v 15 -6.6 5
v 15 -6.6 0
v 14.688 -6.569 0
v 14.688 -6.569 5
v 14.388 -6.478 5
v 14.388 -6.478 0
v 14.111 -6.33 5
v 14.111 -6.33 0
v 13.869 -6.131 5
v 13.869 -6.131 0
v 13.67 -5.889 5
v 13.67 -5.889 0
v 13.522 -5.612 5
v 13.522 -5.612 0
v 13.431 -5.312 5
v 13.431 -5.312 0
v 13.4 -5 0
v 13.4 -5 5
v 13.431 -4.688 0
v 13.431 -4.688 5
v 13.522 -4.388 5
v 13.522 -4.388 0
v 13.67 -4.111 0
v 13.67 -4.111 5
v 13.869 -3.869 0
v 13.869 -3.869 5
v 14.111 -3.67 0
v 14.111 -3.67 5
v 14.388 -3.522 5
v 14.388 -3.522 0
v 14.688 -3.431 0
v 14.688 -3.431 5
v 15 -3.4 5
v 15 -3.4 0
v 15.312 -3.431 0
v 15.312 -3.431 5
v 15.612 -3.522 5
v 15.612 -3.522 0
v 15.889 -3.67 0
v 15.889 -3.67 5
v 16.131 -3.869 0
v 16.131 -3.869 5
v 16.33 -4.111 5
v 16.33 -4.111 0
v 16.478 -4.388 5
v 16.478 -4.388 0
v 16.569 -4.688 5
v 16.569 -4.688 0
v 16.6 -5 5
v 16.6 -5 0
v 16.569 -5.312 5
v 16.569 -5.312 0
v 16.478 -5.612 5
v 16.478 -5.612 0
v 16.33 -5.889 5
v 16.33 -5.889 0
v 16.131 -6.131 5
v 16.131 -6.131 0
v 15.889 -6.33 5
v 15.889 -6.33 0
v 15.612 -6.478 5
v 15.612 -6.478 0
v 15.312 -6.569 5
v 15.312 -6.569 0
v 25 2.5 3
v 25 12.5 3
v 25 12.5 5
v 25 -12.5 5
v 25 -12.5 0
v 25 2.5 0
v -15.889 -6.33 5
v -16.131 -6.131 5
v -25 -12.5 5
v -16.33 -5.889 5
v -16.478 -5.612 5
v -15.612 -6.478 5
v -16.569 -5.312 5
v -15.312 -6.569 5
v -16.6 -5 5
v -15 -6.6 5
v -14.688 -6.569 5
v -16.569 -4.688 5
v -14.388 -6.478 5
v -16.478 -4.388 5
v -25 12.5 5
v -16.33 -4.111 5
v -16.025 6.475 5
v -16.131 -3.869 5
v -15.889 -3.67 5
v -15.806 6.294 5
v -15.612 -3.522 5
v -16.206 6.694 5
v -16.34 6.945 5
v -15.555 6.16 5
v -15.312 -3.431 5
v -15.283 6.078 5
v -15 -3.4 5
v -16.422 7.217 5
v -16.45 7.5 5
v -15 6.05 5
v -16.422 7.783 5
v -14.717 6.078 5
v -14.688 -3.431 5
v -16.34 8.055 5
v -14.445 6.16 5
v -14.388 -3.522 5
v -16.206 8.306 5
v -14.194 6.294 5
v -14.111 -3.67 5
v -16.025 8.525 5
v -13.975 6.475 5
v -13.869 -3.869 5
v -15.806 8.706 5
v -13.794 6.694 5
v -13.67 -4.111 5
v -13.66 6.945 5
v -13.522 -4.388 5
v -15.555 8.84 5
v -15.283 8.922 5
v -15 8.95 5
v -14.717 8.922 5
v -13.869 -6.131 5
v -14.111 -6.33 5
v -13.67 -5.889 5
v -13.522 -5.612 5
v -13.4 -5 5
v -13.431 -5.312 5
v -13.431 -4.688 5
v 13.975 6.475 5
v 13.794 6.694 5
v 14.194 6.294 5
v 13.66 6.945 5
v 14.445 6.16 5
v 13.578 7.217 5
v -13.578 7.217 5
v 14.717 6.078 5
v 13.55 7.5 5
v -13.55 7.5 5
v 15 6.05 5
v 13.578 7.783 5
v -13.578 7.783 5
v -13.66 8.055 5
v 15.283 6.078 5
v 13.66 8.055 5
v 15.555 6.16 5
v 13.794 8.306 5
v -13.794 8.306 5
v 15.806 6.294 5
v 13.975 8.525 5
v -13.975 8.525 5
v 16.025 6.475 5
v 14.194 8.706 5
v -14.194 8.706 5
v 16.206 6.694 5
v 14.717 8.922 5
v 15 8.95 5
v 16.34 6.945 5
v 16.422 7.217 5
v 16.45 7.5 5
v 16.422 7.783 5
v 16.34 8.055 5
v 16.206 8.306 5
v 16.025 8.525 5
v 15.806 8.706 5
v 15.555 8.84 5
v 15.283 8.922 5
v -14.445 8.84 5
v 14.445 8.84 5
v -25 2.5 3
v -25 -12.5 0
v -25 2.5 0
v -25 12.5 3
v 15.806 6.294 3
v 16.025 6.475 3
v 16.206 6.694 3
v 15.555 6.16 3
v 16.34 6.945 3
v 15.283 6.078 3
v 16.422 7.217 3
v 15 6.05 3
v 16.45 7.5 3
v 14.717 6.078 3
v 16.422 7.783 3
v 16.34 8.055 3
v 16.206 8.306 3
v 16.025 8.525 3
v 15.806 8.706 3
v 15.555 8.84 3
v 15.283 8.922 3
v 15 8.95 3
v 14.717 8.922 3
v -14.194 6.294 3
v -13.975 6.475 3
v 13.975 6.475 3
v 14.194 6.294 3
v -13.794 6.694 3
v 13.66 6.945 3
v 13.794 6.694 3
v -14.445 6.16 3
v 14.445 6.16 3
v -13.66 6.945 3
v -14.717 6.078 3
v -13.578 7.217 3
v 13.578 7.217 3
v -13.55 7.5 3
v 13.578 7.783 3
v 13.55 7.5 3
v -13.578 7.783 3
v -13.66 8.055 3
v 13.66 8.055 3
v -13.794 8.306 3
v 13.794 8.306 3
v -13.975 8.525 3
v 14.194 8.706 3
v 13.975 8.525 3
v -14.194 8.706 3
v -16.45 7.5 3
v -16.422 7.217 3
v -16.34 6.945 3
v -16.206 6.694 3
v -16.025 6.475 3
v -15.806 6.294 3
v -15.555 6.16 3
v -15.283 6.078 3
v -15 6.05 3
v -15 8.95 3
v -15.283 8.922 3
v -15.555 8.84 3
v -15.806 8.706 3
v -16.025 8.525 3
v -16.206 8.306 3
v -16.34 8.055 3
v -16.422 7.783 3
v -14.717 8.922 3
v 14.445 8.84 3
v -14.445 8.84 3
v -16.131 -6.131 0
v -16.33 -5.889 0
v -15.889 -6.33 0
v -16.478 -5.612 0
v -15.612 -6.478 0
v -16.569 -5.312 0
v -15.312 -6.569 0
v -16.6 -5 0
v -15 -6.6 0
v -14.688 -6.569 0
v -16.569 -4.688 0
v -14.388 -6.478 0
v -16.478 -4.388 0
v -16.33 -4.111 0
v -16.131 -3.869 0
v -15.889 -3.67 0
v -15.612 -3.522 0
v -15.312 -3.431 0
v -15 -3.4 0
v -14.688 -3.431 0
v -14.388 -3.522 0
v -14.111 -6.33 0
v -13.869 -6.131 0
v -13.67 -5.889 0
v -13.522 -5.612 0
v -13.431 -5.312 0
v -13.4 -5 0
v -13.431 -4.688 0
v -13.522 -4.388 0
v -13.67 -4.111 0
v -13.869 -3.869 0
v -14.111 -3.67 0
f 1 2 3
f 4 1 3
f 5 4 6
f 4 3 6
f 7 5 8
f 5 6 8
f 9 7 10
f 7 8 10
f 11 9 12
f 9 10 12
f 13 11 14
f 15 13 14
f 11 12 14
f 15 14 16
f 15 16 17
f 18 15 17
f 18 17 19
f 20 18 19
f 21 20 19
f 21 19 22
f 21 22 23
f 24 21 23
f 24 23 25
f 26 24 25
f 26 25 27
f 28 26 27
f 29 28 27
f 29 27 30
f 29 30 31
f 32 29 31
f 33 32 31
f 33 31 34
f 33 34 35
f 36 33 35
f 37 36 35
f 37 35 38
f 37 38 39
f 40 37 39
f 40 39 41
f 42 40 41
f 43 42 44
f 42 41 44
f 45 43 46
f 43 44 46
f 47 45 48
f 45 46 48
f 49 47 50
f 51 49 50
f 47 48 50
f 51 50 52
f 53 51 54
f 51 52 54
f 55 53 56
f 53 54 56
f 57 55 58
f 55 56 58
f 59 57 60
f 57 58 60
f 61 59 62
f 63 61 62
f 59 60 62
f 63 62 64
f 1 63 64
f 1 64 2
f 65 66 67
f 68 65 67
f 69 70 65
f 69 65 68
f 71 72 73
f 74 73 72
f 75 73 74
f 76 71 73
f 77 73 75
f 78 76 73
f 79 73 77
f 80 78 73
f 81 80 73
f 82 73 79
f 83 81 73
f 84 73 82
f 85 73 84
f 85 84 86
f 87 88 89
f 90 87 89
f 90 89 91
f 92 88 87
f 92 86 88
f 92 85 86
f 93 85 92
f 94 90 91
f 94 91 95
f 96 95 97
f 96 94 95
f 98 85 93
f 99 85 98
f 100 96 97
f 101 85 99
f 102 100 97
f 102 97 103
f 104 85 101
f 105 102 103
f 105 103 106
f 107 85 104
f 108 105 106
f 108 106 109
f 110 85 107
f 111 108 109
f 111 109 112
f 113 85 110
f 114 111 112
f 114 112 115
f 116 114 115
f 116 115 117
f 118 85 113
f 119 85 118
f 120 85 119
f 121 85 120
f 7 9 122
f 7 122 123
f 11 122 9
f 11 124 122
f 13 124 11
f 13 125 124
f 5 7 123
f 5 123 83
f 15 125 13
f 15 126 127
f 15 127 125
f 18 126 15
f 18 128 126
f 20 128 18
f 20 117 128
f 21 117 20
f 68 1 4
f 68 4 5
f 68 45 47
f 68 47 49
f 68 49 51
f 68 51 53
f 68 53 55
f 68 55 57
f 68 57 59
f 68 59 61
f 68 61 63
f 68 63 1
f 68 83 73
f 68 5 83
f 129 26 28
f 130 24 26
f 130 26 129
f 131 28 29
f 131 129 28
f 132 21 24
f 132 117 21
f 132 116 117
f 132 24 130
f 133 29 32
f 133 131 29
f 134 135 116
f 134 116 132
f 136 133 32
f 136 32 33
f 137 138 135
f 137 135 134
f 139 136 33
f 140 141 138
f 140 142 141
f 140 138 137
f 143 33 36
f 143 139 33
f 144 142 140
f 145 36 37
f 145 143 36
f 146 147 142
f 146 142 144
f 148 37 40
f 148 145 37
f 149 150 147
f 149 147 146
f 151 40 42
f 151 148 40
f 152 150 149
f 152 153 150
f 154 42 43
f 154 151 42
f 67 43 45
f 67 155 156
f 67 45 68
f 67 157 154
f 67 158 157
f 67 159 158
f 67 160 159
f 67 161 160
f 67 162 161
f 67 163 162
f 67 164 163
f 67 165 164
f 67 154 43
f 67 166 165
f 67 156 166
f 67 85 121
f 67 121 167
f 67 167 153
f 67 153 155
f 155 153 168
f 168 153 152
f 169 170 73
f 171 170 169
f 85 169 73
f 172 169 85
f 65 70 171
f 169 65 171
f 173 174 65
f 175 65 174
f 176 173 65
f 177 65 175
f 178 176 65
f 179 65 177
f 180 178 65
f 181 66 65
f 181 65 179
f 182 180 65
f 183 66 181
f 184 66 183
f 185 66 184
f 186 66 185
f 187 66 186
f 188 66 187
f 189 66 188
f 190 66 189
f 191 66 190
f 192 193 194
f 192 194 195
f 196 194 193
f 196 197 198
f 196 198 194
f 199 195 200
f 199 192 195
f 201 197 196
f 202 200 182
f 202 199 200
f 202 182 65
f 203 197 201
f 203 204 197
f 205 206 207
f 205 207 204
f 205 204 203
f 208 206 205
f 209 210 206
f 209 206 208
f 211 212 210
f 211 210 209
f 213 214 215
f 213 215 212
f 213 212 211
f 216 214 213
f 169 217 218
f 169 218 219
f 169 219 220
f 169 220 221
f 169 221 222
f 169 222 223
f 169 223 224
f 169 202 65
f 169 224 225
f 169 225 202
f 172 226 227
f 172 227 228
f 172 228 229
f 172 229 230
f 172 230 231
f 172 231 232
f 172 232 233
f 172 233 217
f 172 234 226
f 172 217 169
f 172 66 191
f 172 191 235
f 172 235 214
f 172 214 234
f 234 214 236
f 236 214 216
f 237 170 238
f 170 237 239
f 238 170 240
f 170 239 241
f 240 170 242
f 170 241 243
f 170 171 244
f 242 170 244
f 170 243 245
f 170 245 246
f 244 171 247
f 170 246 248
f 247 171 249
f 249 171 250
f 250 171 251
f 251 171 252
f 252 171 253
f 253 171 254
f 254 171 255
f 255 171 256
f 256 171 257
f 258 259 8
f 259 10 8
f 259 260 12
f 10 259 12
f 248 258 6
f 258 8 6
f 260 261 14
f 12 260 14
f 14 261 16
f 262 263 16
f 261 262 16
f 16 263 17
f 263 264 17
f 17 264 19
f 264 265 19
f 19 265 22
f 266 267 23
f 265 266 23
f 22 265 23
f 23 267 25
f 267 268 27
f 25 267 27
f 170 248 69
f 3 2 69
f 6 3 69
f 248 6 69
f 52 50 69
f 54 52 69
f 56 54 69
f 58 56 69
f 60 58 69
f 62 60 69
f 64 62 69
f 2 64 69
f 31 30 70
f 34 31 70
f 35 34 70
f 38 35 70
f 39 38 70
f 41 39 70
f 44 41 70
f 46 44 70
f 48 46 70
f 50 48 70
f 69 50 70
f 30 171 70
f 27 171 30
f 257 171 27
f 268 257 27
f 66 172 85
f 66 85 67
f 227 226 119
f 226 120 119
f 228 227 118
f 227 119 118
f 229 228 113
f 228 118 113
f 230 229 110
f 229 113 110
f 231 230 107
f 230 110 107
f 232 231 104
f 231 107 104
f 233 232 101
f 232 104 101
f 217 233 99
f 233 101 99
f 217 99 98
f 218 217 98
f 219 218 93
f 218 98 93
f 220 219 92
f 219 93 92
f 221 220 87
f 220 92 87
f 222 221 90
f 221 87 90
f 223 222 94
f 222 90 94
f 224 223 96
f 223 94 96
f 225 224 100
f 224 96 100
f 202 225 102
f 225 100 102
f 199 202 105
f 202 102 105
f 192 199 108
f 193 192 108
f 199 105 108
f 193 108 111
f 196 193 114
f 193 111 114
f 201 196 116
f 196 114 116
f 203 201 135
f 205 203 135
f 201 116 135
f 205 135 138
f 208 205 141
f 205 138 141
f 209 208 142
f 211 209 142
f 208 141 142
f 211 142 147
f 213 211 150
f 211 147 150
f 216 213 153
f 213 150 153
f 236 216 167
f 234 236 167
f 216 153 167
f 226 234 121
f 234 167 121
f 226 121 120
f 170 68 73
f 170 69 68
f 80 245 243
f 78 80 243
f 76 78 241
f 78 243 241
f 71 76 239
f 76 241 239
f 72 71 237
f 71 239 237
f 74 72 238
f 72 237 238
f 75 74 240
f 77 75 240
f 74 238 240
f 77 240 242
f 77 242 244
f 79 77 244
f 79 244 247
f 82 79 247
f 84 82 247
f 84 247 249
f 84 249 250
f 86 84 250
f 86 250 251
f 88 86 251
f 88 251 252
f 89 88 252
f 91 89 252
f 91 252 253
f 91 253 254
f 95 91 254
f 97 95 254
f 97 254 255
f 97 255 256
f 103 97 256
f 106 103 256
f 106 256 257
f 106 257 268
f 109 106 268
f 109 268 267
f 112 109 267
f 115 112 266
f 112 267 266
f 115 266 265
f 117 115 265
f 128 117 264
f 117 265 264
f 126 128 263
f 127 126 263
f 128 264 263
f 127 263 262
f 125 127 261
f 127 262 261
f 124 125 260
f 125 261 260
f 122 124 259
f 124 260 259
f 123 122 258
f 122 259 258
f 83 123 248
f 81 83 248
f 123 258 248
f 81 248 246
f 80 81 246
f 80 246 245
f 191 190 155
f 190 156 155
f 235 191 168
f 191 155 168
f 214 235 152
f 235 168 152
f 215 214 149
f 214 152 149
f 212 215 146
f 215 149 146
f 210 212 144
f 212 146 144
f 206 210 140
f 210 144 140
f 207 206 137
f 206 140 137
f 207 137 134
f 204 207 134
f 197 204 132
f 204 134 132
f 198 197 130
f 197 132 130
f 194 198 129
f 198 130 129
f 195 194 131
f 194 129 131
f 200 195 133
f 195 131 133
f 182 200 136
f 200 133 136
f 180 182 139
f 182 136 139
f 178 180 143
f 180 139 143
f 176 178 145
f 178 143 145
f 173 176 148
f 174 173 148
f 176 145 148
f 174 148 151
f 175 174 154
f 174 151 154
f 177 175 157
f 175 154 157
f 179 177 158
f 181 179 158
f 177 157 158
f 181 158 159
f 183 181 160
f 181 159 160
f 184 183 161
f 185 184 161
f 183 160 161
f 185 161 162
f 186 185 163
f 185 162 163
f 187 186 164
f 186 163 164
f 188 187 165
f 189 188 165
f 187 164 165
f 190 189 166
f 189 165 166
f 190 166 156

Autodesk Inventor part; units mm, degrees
ref_plane "YZ Plane" through (0, 0, 0) normal (1, 0, 0) x (0, 1, 0)
ref_plane "XZ Plane" through (0, 0, 0) normal (0, 1, 0) x (-1, 0, 0)
ref_plane "XY Plane" through (0, 0, 0) normal (0, 0, 1) x (1, 0, 0)
sketch "Sketch13" plane through (0, 0, 0) normal (0, 0, 1) x (1, 0, 0)
  line L0 (-25, 12.5) -> (25, 12.5)
  line L1 (25, 12.5) -> (25, -12.5)
  line L2 (25, -12.5) -> (-25, -12.5)
  line L3 (-25, -12.5) -> (-25, 12.5)
  line L4 (-25, 12.5) -> (25, -12.5) construction
  line L5 (25, 12.5) -> (-25, -12.5) construction
  point P0 (0, 0)
  dimension "d26" = 50
  dimension "d27" = 25
extrude "Extrusion14" add sketch "Sketch13" along normal blind 5
sketch "Sketch14" plane through (0, 0, 0) normal (0, 0, -1) x (-1, 0, 0)
  line L0 (25, -12.5) -> (-25, -12.5) projected
  line L1 (25, 12.5) -> (25, -12.5) projected
  line L2 (-25, 12.5) -> (25, 12.5) projected
  line L3 (-25, -12.5) -> (-25, 12.5) projected
  line L4 (-25, -12.5) -> (-25, 12.5) projected
  line L5 (-25, 2.5) -> (25, 2.5)
  line L6 (25, 12.5) -> (25, -12.5) projected
  point P0 (0, 0)
  point P1 (25, 2.5)
  dimension "d30" = 10
extrude "Extrusion15" cut sketch "Sketch14" against normal blind 3 contours L5 L3 L2 L1
sketch "Sketch16" plane through (0, 0, 3) normal (0, 0, -1) x (-1, 0, 0)
  line L0 (-25, 2.5) -> (-25, 12.5) projected
  line L1 (25, 2.5) -> (-25, 2.5) projected
  line L2 (25, 12.5) -> (25, 2.5) projected
  line L3 (-25, 12.5) -> (25, 12.5) projected
  point P0 (0, 0)
  point P1 (-15, 7.5)
  point P2 (15, 7.5)
  point P3 (-25, 7.5)
  point P4 (25, 7.5)
  dimension "d33" = 10
  dimension "d34" = 10
hole "Hole1" at (15, 7.5, 3) at (-15, 7.5, 3) direction (0, 0, 1) diameter 2.9 end through all
sketch "Sketch17" plane through (0, 0, 5) normal (0, 0, 1) x (1, 0, 0)
  line L0 (-25, 12.5) -> (-25, -12.5) projected
  line L1 (25, -12.5) -> (25, 12.5) projected
  point P0 (0, 0)
  point P1 (-15, -5)
  point P2 (15, -5)
  dimension "d42" = 7.5
  dimension "d43" = 10
  dimension "d44" = 10
hole "Hole2" at (-15, -5, 5) at (15, -5, 5) direction (0, 0, -1) diameter 3.2 end through all
equation "\"d34\" = d33"
equation "\"d44\" = d43"
properties part number "Beam Cover Bracket" material "ABS Plastic"
